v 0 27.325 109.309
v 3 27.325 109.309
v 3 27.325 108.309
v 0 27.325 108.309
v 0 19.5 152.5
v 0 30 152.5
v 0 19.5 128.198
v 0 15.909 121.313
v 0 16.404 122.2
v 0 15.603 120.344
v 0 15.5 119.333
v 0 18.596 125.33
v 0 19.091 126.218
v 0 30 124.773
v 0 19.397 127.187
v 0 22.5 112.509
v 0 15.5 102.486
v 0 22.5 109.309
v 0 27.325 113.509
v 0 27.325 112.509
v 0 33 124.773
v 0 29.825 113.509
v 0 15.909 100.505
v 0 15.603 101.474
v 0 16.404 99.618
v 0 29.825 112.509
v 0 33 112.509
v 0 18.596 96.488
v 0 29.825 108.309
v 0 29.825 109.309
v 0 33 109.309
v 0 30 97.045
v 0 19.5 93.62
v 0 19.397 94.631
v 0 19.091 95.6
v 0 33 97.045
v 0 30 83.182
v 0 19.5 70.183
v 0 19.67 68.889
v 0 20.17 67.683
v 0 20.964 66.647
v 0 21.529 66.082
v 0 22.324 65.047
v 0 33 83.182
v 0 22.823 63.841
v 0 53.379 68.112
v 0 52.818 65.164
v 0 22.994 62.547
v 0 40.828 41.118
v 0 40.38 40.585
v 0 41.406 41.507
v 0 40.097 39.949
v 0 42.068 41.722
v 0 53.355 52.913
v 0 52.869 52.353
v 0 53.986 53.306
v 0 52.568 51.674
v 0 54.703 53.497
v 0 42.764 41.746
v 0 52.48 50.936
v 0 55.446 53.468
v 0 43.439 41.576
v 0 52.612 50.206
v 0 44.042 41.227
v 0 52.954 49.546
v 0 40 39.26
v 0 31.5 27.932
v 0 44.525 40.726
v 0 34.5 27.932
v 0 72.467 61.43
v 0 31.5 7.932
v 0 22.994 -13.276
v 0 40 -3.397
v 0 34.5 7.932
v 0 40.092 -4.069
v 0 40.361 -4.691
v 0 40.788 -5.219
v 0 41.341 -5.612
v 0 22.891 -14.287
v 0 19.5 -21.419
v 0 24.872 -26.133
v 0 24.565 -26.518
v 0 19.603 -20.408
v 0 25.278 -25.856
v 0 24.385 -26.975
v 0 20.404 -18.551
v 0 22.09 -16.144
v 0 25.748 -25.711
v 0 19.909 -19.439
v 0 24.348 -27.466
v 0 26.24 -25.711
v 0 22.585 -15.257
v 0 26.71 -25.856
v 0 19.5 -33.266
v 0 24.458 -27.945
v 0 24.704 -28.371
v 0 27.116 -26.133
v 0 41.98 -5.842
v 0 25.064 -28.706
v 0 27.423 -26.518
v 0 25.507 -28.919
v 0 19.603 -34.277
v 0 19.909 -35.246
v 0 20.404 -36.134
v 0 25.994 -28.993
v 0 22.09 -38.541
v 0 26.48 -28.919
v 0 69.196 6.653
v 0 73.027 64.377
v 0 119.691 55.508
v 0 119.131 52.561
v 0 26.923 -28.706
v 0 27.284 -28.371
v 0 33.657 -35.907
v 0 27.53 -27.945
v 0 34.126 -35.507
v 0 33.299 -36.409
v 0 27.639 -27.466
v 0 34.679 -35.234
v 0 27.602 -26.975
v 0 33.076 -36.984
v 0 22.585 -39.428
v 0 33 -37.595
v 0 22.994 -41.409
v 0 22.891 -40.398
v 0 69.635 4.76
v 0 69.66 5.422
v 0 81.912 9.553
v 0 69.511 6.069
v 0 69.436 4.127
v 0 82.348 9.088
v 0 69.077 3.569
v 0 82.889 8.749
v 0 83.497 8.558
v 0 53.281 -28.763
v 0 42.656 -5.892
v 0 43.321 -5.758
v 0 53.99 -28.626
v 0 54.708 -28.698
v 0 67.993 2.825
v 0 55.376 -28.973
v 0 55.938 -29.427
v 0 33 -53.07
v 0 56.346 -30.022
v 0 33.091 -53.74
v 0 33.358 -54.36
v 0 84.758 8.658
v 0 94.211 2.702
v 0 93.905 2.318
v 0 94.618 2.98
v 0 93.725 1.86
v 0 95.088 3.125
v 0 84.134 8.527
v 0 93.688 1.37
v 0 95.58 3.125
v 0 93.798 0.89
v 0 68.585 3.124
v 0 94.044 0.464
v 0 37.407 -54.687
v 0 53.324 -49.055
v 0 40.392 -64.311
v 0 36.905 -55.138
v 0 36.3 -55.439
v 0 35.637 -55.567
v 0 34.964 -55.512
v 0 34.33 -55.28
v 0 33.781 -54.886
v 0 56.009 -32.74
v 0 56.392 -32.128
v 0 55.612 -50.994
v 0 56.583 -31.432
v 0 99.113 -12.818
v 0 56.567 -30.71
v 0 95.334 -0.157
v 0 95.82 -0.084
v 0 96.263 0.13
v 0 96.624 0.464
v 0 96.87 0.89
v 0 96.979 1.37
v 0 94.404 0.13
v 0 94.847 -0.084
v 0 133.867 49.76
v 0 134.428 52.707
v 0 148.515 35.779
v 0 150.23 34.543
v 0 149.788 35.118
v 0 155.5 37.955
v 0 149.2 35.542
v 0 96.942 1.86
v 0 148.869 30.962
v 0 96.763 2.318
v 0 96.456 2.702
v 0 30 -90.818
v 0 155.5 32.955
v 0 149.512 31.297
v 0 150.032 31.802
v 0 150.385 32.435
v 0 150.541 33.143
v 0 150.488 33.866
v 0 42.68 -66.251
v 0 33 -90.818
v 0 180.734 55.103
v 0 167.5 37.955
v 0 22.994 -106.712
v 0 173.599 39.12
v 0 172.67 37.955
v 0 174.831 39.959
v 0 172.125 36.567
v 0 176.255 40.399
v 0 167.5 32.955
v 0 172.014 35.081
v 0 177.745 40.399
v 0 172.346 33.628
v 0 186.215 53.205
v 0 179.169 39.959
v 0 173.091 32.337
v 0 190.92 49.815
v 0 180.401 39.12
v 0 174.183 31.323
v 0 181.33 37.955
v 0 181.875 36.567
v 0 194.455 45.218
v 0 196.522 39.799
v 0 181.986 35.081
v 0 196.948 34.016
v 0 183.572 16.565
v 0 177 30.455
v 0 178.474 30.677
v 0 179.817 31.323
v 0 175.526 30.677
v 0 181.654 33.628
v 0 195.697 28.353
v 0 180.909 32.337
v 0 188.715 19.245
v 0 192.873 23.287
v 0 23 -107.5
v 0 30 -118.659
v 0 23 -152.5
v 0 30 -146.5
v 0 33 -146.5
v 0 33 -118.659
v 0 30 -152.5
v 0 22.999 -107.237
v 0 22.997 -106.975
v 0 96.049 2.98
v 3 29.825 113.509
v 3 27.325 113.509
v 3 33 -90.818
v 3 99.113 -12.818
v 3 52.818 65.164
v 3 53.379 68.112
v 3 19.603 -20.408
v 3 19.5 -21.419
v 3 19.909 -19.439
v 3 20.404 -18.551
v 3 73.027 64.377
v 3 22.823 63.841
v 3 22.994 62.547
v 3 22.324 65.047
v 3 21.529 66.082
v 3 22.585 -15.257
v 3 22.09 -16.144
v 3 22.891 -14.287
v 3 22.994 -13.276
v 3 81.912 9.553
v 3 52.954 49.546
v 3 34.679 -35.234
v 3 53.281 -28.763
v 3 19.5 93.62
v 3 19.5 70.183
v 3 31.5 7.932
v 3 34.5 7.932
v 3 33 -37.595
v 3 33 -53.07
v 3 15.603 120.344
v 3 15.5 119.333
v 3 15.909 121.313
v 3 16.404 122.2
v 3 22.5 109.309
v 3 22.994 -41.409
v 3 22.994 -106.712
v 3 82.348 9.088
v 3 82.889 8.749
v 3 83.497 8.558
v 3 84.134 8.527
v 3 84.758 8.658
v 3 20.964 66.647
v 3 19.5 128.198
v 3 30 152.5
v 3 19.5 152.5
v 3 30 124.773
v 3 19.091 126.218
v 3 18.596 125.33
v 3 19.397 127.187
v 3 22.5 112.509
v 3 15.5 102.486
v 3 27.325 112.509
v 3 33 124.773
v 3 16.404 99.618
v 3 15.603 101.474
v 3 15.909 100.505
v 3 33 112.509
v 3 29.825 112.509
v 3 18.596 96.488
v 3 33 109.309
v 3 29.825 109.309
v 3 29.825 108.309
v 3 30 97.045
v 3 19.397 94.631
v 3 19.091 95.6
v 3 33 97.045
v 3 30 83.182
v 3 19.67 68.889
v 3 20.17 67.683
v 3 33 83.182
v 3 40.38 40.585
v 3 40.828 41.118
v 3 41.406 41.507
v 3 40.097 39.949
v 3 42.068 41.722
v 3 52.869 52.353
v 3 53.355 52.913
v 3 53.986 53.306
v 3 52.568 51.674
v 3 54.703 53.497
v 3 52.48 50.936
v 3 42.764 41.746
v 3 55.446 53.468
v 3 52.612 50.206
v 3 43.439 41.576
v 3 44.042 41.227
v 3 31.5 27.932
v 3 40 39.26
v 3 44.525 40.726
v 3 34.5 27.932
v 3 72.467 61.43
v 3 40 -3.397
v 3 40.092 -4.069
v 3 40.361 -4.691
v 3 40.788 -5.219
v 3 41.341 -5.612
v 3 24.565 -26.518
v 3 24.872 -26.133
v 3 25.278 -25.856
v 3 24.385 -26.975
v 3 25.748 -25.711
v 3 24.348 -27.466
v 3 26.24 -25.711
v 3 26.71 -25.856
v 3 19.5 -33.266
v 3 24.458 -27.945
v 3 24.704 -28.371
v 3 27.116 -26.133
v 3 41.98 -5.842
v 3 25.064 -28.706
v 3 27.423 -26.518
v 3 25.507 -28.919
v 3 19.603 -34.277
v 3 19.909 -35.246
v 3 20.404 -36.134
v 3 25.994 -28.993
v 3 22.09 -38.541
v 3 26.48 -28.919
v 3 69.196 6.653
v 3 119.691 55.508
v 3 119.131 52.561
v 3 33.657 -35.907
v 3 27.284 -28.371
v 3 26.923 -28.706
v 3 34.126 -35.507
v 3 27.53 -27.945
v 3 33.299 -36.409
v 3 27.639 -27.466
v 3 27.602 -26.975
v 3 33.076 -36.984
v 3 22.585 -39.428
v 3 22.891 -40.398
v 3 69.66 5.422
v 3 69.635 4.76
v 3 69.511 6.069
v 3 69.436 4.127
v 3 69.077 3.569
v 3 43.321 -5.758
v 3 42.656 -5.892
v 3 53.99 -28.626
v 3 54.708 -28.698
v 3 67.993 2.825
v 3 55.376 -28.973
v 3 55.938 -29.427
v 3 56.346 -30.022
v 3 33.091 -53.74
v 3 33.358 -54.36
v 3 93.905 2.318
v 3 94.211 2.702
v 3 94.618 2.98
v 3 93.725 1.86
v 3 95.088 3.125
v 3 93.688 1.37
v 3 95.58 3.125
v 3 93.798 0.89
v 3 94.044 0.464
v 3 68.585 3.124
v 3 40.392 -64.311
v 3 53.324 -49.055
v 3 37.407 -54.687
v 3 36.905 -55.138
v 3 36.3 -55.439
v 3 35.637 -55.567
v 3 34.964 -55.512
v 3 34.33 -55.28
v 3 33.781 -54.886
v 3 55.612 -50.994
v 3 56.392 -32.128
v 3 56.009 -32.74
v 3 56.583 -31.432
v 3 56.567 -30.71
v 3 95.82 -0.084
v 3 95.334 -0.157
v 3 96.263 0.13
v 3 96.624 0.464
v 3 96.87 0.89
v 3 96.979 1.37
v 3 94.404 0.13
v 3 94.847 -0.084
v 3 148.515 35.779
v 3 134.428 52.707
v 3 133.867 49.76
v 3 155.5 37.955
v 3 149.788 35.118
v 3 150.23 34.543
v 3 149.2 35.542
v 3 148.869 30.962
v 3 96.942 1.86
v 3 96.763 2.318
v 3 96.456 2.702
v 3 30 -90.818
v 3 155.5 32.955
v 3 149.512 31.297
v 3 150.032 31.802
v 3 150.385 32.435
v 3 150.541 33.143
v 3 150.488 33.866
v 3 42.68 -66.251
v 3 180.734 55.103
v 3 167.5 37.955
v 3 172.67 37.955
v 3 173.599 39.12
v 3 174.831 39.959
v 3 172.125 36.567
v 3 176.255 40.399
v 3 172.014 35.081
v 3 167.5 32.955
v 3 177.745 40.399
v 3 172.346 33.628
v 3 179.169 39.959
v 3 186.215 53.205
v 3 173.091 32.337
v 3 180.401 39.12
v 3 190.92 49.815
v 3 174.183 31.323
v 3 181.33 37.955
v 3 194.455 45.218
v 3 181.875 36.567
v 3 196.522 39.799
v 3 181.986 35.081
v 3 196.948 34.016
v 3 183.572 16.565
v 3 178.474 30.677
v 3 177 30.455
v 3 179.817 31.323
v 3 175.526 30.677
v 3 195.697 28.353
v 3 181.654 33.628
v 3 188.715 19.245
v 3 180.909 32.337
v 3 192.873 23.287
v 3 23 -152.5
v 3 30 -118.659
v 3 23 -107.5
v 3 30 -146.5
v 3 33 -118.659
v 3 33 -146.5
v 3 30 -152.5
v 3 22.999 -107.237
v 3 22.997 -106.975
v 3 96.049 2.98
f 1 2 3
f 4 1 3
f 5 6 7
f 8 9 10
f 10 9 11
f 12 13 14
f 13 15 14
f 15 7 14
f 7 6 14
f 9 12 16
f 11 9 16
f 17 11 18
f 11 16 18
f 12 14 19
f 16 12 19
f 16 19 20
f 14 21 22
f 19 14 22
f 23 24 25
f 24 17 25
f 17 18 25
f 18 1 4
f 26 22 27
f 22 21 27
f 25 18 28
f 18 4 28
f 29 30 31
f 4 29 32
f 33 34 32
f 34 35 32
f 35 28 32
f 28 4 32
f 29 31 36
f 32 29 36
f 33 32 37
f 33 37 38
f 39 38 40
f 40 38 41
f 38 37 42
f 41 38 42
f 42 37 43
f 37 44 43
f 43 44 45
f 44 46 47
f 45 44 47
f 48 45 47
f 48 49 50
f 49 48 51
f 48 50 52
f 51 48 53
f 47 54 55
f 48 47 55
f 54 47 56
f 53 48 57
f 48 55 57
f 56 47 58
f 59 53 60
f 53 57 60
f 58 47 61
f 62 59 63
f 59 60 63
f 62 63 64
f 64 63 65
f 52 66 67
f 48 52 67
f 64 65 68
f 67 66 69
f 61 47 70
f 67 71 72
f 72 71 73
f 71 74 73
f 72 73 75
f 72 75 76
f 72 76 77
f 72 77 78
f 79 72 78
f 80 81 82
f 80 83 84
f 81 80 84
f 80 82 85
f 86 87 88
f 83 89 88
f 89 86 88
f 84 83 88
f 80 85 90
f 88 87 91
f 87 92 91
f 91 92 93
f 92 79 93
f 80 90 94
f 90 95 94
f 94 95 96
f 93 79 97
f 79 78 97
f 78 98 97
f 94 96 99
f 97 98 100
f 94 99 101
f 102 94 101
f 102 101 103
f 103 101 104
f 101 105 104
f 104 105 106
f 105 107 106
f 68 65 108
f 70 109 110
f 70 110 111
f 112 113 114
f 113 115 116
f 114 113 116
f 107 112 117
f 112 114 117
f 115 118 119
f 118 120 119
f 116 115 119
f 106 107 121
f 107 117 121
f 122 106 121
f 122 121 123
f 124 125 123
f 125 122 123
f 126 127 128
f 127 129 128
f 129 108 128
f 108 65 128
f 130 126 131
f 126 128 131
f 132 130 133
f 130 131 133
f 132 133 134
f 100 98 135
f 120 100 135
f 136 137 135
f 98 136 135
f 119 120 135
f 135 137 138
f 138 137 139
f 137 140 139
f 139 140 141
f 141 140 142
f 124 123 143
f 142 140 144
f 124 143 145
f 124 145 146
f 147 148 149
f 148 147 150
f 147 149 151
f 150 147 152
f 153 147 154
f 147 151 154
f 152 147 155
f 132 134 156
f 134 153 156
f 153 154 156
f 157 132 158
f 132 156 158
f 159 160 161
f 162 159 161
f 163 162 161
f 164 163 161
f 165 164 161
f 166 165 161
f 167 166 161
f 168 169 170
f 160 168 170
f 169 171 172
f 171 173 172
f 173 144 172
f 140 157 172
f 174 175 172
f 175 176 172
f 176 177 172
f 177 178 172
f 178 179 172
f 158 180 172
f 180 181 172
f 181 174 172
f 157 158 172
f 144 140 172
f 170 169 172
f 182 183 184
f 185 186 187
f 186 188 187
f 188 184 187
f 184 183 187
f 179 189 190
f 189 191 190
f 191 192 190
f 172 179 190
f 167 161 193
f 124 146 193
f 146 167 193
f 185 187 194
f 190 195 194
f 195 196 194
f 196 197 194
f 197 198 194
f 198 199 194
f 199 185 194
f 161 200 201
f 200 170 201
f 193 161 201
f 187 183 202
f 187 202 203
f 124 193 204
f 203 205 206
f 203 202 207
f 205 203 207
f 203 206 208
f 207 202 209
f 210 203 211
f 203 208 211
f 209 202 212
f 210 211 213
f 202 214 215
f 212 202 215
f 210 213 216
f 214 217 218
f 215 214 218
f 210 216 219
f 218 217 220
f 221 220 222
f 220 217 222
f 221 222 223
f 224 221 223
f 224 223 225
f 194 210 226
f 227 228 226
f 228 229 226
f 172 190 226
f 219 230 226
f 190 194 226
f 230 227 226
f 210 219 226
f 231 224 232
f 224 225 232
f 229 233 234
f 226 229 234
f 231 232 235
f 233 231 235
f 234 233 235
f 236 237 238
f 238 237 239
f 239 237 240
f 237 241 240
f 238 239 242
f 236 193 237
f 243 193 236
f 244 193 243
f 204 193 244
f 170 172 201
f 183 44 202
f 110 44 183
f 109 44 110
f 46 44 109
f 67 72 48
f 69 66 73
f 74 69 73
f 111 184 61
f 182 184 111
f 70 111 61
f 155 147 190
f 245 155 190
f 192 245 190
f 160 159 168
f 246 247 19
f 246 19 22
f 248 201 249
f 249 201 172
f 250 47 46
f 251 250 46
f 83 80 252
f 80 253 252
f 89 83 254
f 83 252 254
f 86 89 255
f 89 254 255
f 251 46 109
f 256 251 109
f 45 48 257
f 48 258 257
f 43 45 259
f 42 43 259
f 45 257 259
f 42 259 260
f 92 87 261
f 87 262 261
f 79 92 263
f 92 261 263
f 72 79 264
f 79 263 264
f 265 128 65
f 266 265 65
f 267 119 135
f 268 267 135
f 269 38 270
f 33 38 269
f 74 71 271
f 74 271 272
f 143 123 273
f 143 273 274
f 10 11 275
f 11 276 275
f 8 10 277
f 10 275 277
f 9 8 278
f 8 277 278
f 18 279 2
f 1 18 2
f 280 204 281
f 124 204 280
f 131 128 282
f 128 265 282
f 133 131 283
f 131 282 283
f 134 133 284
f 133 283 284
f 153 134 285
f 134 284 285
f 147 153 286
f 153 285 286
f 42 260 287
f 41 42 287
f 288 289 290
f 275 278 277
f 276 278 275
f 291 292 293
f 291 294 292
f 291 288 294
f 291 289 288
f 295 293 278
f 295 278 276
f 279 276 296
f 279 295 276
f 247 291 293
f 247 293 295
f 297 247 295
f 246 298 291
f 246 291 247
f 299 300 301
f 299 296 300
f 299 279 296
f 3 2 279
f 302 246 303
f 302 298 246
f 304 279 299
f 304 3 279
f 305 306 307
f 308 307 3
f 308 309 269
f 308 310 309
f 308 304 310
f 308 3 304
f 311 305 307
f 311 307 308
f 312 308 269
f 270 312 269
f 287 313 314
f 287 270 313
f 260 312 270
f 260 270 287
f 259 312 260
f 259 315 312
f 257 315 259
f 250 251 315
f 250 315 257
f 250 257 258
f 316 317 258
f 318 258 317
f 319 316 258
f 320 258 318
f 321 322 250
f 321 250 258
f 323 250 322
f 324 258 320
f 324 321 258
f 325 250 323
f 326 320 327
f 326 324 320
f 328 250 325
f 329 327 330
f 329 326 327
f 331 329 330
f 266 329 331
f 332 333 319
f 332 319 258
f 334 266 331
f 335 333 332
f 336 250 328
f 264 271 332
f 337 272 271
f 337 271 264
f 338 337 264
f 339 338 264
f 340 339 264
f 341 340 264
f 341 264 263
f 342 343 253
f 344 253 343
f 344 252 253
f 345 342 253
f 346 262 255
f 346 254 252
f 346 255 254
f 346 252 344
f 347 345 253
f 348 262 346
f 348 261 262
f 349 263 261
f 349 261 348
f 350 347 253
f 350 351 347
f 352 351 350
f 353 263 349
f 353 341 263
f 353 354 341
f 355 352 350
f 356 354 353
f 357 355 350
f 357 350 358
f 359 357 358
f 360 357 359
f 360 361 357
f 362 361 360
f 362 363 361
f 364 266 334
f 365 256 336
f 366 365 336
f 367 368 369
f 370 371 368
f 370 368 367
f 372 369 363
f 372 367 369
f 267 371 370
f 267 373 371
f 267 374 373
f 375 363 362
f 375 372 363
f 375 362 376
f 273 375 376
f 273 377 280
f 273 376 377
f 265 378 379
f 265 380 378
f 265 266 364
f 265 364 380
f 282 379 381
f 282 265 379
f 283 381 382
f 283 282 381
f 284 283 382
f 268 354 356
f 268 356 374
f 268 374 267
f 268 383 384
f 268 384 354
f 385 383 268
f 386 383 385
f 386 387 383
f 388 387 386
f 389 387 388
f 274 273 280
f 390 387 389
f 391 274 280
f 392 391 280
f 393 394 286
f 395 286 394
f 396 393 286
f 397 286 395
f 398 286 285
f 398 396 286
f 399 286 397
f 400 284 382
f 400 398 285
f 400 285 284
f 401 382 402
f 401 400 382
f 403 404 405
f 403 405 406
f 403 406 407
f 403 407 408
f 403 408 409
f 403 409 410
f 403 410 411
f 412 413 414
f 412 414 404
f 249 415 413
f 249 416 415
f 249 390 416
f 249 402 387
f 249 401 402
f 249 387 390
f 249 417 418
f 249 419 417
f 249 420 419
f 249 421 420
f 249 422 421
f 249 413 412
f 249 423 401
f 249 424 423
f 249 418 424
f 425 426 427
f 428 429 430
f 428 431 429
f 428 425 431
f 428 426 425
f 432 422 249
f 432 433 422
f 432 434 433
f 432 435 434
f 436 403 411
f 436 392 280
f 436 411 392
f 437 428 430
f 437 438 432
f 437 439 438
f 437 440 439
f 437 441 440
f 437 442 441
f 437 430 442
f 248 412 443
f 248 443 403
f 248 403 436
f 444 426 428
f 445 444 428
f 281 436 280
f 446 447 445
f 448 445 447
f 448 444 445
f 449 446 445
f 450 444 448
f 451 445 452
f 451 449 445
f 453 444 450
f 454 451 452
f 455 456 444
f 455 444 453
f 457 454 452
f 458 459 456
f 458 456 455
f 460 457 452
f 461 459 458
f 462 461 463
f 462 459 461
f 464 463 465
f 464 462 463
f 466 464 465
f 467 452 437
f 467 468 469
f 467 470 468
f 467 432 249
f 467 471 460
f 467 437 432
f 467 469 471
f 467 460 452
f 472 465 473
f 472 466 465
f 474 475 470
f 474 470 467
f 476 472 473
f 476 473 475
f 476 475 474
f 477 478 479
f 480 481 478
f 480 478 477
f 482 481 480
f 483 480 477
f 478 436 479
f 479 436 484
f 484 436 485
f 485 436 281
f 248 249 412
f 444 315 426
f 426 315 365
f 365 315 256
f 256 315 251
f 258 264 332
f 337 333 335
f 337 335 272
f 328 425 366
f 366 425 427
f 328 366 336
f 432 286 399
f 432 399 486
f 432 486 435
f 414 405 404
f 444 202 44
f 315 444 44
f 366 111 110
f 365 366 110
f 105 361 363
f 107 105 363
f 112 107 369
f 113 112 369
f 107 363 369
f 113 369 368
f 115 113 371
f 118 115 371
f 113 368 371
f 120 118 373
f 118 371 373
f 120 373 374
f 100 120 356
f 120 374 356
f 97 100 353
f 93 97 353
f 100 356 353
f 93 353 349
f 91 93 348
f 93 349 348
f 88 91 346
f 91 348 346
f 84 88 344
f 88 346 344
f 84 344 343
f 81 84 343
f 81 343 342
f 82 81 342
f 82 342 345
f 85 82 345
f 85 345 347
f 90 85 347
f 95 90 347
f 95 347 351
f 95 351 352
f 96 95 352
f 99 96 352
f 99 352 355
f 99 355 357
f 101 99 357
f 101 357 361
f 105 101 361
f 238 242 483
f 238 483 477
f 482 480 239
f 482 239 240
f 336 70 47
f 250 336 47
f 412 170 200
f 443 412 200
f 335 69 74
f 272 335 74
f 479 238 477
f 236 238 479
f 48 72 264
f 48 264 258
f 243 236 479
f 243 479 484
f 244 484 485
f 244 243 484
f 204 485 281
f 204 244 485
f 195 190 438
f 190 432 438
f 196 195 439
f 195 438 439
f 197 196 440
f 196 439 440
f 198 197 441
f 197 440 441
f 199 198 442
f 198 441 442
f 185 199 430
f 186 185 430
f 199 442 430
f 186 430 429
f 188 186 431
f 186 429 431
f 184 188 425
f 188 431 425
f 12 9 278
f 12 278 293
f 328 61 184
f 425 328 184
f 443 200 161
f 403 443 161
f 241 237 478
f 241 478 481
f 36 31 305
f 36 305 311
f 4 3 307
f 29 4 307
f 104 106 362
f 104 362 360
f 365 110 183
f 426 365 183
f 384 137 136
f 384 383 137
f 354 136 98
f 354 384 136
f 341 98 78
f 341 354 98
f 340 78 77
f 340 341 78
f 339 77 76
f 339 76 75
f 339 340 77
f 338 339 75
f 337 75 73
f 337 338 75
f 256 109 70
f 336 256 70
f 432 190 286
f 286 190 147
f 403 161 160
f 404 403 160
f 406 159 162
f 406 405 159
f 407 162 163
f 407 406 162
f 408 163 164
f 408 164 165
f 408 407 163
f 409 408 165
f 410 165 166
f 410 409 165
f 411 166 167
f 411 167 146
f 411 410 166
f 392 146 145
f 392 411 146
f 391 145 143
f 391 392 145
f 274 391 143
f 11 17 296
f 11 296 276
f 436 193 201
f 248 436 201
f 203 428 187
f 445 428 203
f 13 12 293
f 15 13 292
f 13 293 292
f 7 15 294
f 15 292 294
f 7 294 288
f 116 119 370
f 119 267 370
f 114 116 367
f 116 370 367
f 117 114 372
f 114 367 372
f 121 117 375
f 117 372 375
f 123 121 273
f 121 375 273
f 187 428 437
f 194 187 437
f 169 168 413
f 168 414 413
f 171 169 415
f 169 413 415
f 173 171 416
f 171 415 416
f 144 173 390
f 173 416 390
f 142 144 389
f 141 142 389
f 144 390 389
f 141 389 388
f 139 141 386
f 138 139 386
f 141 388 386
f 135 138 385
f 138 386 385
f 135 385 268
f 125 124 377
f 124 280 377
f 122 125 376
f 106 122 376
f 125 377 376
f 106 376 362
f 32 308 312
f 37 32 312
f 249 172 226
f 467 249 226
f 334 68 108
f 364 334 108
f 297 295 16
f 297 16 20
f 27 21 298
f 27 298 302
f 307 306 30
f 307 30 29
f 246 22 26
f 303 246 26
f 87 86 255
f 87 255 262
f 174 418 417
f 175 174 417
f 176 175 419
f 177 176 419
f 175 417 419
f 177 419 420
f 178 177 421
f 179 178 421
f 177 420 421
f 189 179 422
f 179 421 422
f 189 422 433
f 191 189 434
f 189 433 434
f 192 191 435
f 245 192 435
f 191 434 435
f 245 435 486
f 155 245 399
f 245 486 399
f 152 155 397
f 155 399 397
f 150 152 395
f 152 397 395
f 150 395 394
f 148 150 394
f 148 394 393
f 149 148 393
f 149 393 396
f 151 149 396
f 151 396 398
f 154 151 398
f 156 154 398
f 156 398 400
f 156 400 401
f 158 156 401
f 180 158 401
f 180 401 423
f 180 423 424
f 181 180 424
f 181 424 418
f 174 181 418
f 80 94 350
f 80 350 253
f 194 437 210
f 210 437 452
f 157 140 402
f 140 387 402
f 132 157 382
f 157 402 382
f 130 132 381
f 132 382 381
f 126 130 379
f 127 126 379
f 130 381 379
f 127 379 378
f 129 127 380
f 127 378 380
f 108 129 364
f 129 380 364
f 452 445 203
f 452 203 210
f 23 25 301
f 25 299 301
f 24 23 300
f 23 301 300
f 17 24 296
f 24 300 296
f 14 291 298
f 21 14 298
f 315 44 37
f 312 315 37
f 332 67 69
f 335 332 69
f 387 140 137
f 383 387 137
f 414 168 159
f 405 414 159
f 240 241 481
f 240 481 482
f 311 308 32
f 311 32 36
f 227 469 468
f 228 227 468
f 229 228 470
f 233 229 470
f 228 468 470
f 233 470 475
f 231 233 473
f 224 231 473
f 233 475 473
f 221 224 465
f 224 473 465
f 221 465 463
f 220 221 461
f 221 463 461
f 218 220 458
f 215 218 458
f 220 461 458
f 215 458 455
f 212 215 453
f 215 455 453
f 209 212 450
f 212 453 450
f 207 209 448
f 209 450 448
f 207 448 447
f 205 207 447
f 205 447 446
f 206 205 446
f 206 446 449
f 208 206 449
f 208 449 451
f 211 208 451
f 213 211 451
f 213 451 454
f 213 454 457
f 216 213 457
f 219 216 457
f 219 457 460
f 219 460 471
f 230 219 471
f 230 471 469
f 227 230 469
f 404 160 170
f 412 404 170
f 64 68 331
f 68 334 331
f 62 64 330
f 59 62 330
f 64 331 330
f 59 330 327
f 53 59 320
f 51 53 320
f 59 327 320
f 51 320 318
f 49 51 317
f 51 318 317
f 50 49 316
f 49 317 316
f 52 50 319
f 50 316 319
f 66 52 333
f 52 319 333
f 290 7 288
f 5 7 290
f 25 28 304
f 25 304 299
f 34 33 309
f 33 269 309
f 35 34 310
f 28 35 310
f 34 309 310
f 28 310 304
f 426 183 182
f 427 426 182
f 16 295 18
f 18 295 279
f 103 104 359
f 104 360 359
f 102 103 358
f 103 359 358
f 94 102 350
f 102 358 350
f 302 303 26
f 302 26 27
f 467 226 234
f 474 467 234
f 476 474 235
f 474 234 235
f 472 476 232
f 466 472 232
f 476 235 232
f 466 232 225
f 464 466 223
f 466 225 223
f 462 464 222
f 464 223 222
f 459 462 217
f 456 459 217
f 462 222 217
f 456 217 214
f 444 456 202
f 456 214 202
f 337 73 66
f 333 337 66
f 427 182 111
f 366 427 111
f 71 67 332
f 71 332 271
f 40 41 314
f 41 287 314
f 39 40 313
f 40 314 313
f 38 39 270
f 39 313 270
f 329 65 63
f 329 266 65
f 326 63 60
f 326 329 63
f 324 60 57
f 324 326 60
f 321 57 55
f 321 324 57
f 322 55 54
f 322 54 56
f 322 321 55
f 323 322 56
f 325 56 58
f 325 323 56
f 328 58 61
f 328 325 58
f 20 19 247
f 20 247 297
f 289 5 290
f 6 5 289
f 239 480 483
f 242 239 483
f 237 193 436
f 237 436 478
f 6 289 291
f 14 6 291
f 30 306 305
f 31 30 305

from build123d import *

# Parameters (mm, degrees)
BOSS_EXTRUDE1_DEPTH      = 3
SKETCH2_W                = 27.727272727
SKETCH2_H                = 3
SKETCH2_W_2              = 3
SKETCH2_H_2              = 18
SKETCH2_H_3              = 9
SKETCH2_W_3              = 23.343342349
SKETCH2_W_4              = 23.34334235
SKETCH2_W_5              = 6
CUT_EXTRUDE1_DEPTH       = 157.058482628
CUT_EXTRUDE1_DEPTH_BACK  = 157.058482628
SKETCH3_W                = 3.2
SKETCH3_H                = 10.5
SKETCH3_W_2              = 5.2
SKETCH3_H_2              = 2.5
CUT_EXTRUDE2_DEPTH       = 157.058482628
CUT_EXTRUDE2_DEPTH_BACK  = 157.058482628
FILLET1_R                = 2.5
BOSS_EXTRUDE2_DEPTH      = 3
FILLET2_R                = 2.5
SKETCH6_R                = 5
SKETCH6_R_2              = 1.65
CUT_EXTRUDE5_DEPTH       = 250.147044935
CUT_EXTRUDE5_DEPTH_BACK  = 250.147044935
SKETCH8_R                = 10
CUT_EXTRUDE6_DEPTH       = 250.147044935
CUT_EXTRUDE6_DEPTH_BACK  = 250.147044935
SKETCH9_W                = 20
SKETCH9_H                = 3
CUT_EXTRUDE7_DEPTH       = 250.147044935
CUT_EXTRUDE7_DEPTH_BACK  = 250.147044935
SKETCH10_W               = 23.343342349
SKETCH10_H               = 3
SKETCH10_R               = 10
SKETCH10_W_2             = 23.34334235
CUT_EXTRUDE8_DEPTH       = 250.147044935
CUT_EXTRUDE8_DEPTH_BACK  = 250.147044935
SKETCH11_W               = 27.840909091
SKETCH11_H               = 3
CUT_EXTRUDE9_DEPTH       = 250.147044935
CUT_EXTRUDE9_DEPTH_BACK  = 250.147044935
FILLET3_R                = 5
SKETCH12_W               = 5
SKETCH12_H               = 12
CUT_EXTRUDE10_DEPTH      = 250.147044935
CUT_EXTRUDE10_DEPTH_BACK = 250.147044935


with BuildPart() as part:
    # Sketch1 → Boss-Extrude1 (new body)
    with BuildSketch(Plane(origin=(0, 0, 0), x_dir=(0, 0, -1), z_dir=(1, 0, 0))):
        with BuildLine():
            Line((-152.5, 33), (152.5, 33))
            Line((152.5, 33), (152.5, 23))
            Line((152.5, 23), (107.5, 23))
            ThreePointArc((107.5, 23), (72.144660941, 8.355339059), (57.5, -27))
            Line((57.5, -27), (57.5, -33))
            Line((57.5, -33), (-152.5, -33))
            Line((-152.5, -33), (-152.5, 33))
        make_face()
    extrude(amount=BOSS_EXTRUDE1_DEPTH)

    # Sketch2 → Cut-Extrude1 (cut, two sides)
    with BuildSketch(Plane(origin=(3, 0, 0), x_dir=(0, 0, -1), z_dir=(1, 0, 0))) as cut_extrude1_sk:
        with Locations((-138.636363636, 31.5)):
            Rectangle(SKETCH2_W, SKETCH2_H)
        with Locations((-83.181818182, 31.5)):
            Rectangle(SKETCH2_W, SKETCH2_H)
        with Locations((-27.727272728, 31.5)):
            Rectangle(SKETCH2_W, SKETCH2_H)
        with Locations((-151, 3)):
            Rectangle(SKETCH2_W_2, SKETCH2_H_2)
        with Locations((-151, -28.5)):
            Rectangle(SKETCH2_W_2, SKETCH2_H_3)
        with Locations((-117.484986475, -28.5)):
            Rectangle(SKETCH2_W_3, SKETCH2_H)
        with Locations((-70.798301777, -28.5)):
            Rectangle(SKETCH2_W_3, SKETCH2_H)
        with Locations((22.575067622, -28.5)):
            Rectangle(SKETCH2_W_4, SKETCH2_H)
        with Locations((149.5, 31.5)):
            Rectangle(SKETCH2_W_5, SKETCH2_H)
        with Locations((-24.111617078, -28.5)):
            Rectangle(SKETCH2_W_3, SKETCH2_H)
    extrude(amount=CUT_EXTRUDE1_DEPTH, mode=Mode.SUBTRACT)
    extrude(cut_extrude1_sk.sketch, amount=-CUT_EXTRUDE1_DEPTH_BACK, mode=Mode.SUBTRACT)

    # Sketch3 → Cut-Extrude2 (cut, two sides)
    with BuildSketch(Plane(origin=(3, 0, 0), x_dir=(0, 0, -1), z_dir=(1, 0, 0))) as cut_extrude2_sk:
        with Locations((-110.909090909, 27.75)):
            Rectangle(SKETCH3_W, SKETCH3_H)
        with Locations((-110.909090909, 28.575)):
            Rectangle(SKETCH3_W_2, SKETCH3_H_2)
    extrude(amount=CUT_EXTRUDE2_DEPTH, mode=Mode.SUBTRACT)
    extrude(cut_extrude2_sk.sketch, amount=-CUT_EXTRUDE2_DEPTH_BACK, mode=Mode.SUBTRACT)

    # Fillet1
    fillet1_edges = [part.edges().sort_by_distance(p)[0] for p in [
        (1.5, -33, -57.5),
    ]]
    fillet(fillet1_edges, radius=FILLET1_R)

    # Sketch4 → Boss-Extrude2 (add)
    with BuildSketch(Plane(origin=(0, 0, 0), x_dir=(0, 0, -1), z_dir=(1, 0, 0))):
        with BuildLine():
            Line((-83.181818182, 33), (-83.181818182, 30))
            Line((-83.181818182, 30), (35.818181818, 30))
            Line((35.818181818, 30), (35.818181818, 33))
            Line((35.818181818, 33), (25.753026775, 61.931534749))
            Line((25.753026775, 61.931534749), (59.886459158, 33))
            Line((59.886459158, 33), (90.818181818, 33))
            Line((90.818181818, 33), (12.817635516, 99.113348651))
            Line((12.817635516, 99.113348651), (-16.565017269, 183.571584658))
            ThreePointArc((-16.565017269, 183.571584658), (-36.922973482, 196.946020133), (-55.102803407, 180.73442893))
            Line((-55.102803407, 180.73442893), (-83.181818182, 33))
        make_face()
        Polygon((6.913219914, 40), (-46.974972009, 40), (-3.929894771, 71.167721507), align=None, mode=Mode.SUBTRACT)
        Polygon((-54.643252411, 49.263022537), (-34.033564648, 157.698467174), (-8.047004759, 83.002045982), align=None, mode=Mode.SUBTRACT)
    extrude(amount=BOSS_EXTRUDE2_DEPTH)

    # Fillet2
    fillet2_edges = [part.edges().sort_by_distance(p)[0] for p in [
        (1.5, 33, -59.886459158),
        (1.5, 61.931534749, -25.753026775),
        (1.5, 33, -35.818181818),
        (1.5, 40, -6.913219914),
        (1.5, 71.167721507, 3.929894771),
        (1.5, 40, 46.974972009),
        (1.5, 49.263022537, 54.643252411),
        (1.5, 83.002045982, 8.047004759),
        (1.5, 157.698467174, 34.033564648),
    ]]
    fillet(fillet2_edges, radius=FILLET2_R)

    # Sketch6 → Cut-Extrude5 (cut, two sides)
    with BuildSketch(Plane(origin=(3, 0, 0), x_dir=(0, 0, -1), z_dir=(1, 0, 0))) as cut_extrude5_sk:
        with Locations((-35.454545455, 177)):
            Circle(SKETCH6_R)
        with Locations((-1.492946709, 95.333591431)):
            Circle(SKETCH6_R_2)
        with Locations((27.342535354, 25.993797473)):
            Circle(SKETCH6_R_2)
    extrude(amount=CUT_EXTRUDE5_DEPTH, mode=Mode.SUBTRACT)
    extrude(cut_extrude5_sk.sketch, amount=-CUT_EXTRUDE5_DEPTH_BACK, mode=Mode.SUBTRACT)

    # Sketch8 → Cut-Extrude6 (cut, two sides)
    with BuildSketch(Plane(origin=(0, 0, 0), x_dir=(0, 0, -1), z_dir=(1, 0, 0))) as cut_extrude6_sk:
        with Locations((-5, 0)):
            Circle(SKETCH8_R)
        with Locations((-40, 0)):
            Circle(SKETCH8_R)
    extrude(amount=CUT_EXTRUDE6_DEPTH, mode=Mode.SUBTRACT)
    extrude(cut_extrude6_sk.sketch, amount=-CUT_EXTRUDE6_DEPTH_BACK, mode=Mode.SUBTRACT)

    # Sketch9 → Cut-Extrude7 (cut, two sides)
    with BuildSketch(Plane(origin=(0, 0, 0), x_dir=(0, 0, -1), z_dir=(1, 0, 0))) as cut_extrude7_sk:
        Polygon((-68.111670983, 53.378521315), (-64.377242053, 73.026779267), (-61.43000336, 72.466614928), (-65.16443229, 52.818356975), align=None)
        Polygon((-55.507973344, 119.691391905), (-52.707151647, 134.427585369), (-49.759912954, 133.867421029), (-52.560734651, 119.131227565), align=None)
        Polygon((64.311409407, 40.391956194), (49.054577079, 53.32366402), (50.994333253, 55.612188869), (66.251165581, 42.680481043), align=None)
        with Locations((-17.931502251, 33)):
            Rectangle(SKETCH9_W, SKETCH9_H)
    extrude(amount=CUT_EXTRUDE7_DEPTH, mode=Mode.SUBTRACT)
    extrude(cut_extrude7_sk.sketch, amount=-CUT_EXTRUDE7_DEPTH_BACK, mode=Mode.SUBTRACT)

    # Sketch10 → Cut-Extrude8 (cut, two sides)
    with BuildSketch(Plane(origin=(0, 0, 0), x_dir=(0, 0, -1), z_dir=(1, 0, 0))) as cut_extrude8_sk:
        with BuildLine():
            Line((-149.5, -33), (55, -33))
            ThreePointArc((55, -33), (56.767766953, -32.267766953), (57.5, -30.5))
            Line((57.5, -30.5), (57.5, -27))
            ThreePointArc((57.5, -27), (71.867312479, 8.075797639), (106.712463201, 22.993797473))
            Line((106.712463201, 22.993797473), (39.832195251, 22.993797473))
            Line((39.832195251, 22.993797473), (34.842535354, 19.5))
            Line((34.842535354, 19.5), (19.842535354, 19.5))
            Line((19.842535354, 19.5), (14.852875457, 22.993797473))
            Line((14.852875457, 22.993797473), (-64.61787351, 22.993797473))
            Line((-64.61787351, 22.993797473), (-68.111670983, 19.5))
            Line((-68.111670983, 19.5), (-95.196498882, 19.5))
            Line((-95.196498882, 19.5), (-100.909090909, 15.5))
            Line((-100.909090909, 15.5), (-120.909090909, 15.5))
            Line((-120.909090909, 15.5), (-126.621682936, 19.5))
            Line((-126.621682936, 19.5), (-152.5, 19.5))
            Line((-152.5, 19.5), (-152.5, 12))
            Line((-152.5, 12), (-149.5, 12))
            Line((-149.5, 12), (-149.5, -6))
            Line((-149.5, -6), (-152.5, -6))
            Line((-152.5, -6), (-152.5, -24))
            Line((-152.5, -24), (-149.5, -24))
            Line((-149.5, -24), (-149.5, -33))
        make_face()
        with Locations((-117.484986475, -28.5)):
            Rectangle(SKETCH10_W, SKETCH10_H, mode=Mode.SUBTRACT)
        with Locations((-70.798301777, -28.5)):
            Rectangle(SKETCH10_W, SKETCH10_H, mode=Mode.SUBTRACT)
        with Locations((-24.111617078, -28.5)):
            Rectangle(SKETCH10_W, SKETCH10_H, mode=Mode.SUBTRACT)
        with Locations((-40, 0)):
            Circle(SKETCH10_R, mode=Mode.SUBTRACT)
        with Locations((-5, 0)):
            Circle(SKETCH10_R, mode=Mode.SUBTRACT)
        with Locations((22.575067622, -28.5)):
            Rectangle(SKETCH10_W_2, SKETCH10_H, mode=Mode.SUBTRACT)
    extrude(amount=CUT_EXTRUDE8_DEPTH, mode=Mode.SUBTRACT)
    extrude(cut_extrude8_sk.sketch, amount=-CUT_EXTRUDE8_DEPTH_BACK, mode=Mode.SUBTRACT)

    # Sketch11 → Cut-Extrude9 (cut, two sides)
    with BuildSketch(Plane(origin=(0, 0, 0), x_dir=(0, 0, -1), z_dir=(1, 0, 0))) as cut_extrude9_sk:
        with Locations((104.738636364, 31.5)):
            Rectangle(SKETCH11_W, SKETCH11_H)
    extrude(amount=CUT_EXTRUDE9_DEPTH, mode=Mode.SUBTRACT)
    extrude(cut_extrude9_sk.sketch, amount=-CUT_EXTRUDE9_DEPTH_BACK, mode=Mode.SUBTRACT)

    # Fillet3
    fillet3_edges = [part.edges().sort_by_distance(p)[0] for p in [
        (1.5, 15.5, 100.909090909),
        (1.5, 19.5, 95.196498882),
        (1.5, 19.5, 68.111670983),
        (1.5, 22.993797473, 64.61787351),
        (1.5, 22.993797473, -14.852875457),
        (1.5, 19.5, -19.842535354),
        (1.5, 19.5, -34.842535354),
        (1.5, 22.993797473, -39.832195251),
        (1.5, 19.5, 126.621682936),
        (1.5, 15.5, 120.909090909),
    ]]
    fillet(fillet3_edges, radius=FILLET3_R)

    # Sketch12 → Cut-Extrude10 (cut, two sides)
    with BuildSketch(Plane(origin=(3, 0, 0), x_dir=(0, 0, -1), z_dir=(1, 0, 0))) as cut_extrude10_sk:
        with Locations((-35.454545455, 161.5)):
            Rectangle(SKETCH12_W, SKETCH12_H)
    extrude(amount=CUT_EXTRUDE10_DEPTH, mode=Mode.SUBTRACT)
    extrude(cut_extrude10_sk.sketch, amount=-CUT_EXTRUDE10_DEPTH_BACK, mode=Mode.SUBTRACT)


solid = part.part
